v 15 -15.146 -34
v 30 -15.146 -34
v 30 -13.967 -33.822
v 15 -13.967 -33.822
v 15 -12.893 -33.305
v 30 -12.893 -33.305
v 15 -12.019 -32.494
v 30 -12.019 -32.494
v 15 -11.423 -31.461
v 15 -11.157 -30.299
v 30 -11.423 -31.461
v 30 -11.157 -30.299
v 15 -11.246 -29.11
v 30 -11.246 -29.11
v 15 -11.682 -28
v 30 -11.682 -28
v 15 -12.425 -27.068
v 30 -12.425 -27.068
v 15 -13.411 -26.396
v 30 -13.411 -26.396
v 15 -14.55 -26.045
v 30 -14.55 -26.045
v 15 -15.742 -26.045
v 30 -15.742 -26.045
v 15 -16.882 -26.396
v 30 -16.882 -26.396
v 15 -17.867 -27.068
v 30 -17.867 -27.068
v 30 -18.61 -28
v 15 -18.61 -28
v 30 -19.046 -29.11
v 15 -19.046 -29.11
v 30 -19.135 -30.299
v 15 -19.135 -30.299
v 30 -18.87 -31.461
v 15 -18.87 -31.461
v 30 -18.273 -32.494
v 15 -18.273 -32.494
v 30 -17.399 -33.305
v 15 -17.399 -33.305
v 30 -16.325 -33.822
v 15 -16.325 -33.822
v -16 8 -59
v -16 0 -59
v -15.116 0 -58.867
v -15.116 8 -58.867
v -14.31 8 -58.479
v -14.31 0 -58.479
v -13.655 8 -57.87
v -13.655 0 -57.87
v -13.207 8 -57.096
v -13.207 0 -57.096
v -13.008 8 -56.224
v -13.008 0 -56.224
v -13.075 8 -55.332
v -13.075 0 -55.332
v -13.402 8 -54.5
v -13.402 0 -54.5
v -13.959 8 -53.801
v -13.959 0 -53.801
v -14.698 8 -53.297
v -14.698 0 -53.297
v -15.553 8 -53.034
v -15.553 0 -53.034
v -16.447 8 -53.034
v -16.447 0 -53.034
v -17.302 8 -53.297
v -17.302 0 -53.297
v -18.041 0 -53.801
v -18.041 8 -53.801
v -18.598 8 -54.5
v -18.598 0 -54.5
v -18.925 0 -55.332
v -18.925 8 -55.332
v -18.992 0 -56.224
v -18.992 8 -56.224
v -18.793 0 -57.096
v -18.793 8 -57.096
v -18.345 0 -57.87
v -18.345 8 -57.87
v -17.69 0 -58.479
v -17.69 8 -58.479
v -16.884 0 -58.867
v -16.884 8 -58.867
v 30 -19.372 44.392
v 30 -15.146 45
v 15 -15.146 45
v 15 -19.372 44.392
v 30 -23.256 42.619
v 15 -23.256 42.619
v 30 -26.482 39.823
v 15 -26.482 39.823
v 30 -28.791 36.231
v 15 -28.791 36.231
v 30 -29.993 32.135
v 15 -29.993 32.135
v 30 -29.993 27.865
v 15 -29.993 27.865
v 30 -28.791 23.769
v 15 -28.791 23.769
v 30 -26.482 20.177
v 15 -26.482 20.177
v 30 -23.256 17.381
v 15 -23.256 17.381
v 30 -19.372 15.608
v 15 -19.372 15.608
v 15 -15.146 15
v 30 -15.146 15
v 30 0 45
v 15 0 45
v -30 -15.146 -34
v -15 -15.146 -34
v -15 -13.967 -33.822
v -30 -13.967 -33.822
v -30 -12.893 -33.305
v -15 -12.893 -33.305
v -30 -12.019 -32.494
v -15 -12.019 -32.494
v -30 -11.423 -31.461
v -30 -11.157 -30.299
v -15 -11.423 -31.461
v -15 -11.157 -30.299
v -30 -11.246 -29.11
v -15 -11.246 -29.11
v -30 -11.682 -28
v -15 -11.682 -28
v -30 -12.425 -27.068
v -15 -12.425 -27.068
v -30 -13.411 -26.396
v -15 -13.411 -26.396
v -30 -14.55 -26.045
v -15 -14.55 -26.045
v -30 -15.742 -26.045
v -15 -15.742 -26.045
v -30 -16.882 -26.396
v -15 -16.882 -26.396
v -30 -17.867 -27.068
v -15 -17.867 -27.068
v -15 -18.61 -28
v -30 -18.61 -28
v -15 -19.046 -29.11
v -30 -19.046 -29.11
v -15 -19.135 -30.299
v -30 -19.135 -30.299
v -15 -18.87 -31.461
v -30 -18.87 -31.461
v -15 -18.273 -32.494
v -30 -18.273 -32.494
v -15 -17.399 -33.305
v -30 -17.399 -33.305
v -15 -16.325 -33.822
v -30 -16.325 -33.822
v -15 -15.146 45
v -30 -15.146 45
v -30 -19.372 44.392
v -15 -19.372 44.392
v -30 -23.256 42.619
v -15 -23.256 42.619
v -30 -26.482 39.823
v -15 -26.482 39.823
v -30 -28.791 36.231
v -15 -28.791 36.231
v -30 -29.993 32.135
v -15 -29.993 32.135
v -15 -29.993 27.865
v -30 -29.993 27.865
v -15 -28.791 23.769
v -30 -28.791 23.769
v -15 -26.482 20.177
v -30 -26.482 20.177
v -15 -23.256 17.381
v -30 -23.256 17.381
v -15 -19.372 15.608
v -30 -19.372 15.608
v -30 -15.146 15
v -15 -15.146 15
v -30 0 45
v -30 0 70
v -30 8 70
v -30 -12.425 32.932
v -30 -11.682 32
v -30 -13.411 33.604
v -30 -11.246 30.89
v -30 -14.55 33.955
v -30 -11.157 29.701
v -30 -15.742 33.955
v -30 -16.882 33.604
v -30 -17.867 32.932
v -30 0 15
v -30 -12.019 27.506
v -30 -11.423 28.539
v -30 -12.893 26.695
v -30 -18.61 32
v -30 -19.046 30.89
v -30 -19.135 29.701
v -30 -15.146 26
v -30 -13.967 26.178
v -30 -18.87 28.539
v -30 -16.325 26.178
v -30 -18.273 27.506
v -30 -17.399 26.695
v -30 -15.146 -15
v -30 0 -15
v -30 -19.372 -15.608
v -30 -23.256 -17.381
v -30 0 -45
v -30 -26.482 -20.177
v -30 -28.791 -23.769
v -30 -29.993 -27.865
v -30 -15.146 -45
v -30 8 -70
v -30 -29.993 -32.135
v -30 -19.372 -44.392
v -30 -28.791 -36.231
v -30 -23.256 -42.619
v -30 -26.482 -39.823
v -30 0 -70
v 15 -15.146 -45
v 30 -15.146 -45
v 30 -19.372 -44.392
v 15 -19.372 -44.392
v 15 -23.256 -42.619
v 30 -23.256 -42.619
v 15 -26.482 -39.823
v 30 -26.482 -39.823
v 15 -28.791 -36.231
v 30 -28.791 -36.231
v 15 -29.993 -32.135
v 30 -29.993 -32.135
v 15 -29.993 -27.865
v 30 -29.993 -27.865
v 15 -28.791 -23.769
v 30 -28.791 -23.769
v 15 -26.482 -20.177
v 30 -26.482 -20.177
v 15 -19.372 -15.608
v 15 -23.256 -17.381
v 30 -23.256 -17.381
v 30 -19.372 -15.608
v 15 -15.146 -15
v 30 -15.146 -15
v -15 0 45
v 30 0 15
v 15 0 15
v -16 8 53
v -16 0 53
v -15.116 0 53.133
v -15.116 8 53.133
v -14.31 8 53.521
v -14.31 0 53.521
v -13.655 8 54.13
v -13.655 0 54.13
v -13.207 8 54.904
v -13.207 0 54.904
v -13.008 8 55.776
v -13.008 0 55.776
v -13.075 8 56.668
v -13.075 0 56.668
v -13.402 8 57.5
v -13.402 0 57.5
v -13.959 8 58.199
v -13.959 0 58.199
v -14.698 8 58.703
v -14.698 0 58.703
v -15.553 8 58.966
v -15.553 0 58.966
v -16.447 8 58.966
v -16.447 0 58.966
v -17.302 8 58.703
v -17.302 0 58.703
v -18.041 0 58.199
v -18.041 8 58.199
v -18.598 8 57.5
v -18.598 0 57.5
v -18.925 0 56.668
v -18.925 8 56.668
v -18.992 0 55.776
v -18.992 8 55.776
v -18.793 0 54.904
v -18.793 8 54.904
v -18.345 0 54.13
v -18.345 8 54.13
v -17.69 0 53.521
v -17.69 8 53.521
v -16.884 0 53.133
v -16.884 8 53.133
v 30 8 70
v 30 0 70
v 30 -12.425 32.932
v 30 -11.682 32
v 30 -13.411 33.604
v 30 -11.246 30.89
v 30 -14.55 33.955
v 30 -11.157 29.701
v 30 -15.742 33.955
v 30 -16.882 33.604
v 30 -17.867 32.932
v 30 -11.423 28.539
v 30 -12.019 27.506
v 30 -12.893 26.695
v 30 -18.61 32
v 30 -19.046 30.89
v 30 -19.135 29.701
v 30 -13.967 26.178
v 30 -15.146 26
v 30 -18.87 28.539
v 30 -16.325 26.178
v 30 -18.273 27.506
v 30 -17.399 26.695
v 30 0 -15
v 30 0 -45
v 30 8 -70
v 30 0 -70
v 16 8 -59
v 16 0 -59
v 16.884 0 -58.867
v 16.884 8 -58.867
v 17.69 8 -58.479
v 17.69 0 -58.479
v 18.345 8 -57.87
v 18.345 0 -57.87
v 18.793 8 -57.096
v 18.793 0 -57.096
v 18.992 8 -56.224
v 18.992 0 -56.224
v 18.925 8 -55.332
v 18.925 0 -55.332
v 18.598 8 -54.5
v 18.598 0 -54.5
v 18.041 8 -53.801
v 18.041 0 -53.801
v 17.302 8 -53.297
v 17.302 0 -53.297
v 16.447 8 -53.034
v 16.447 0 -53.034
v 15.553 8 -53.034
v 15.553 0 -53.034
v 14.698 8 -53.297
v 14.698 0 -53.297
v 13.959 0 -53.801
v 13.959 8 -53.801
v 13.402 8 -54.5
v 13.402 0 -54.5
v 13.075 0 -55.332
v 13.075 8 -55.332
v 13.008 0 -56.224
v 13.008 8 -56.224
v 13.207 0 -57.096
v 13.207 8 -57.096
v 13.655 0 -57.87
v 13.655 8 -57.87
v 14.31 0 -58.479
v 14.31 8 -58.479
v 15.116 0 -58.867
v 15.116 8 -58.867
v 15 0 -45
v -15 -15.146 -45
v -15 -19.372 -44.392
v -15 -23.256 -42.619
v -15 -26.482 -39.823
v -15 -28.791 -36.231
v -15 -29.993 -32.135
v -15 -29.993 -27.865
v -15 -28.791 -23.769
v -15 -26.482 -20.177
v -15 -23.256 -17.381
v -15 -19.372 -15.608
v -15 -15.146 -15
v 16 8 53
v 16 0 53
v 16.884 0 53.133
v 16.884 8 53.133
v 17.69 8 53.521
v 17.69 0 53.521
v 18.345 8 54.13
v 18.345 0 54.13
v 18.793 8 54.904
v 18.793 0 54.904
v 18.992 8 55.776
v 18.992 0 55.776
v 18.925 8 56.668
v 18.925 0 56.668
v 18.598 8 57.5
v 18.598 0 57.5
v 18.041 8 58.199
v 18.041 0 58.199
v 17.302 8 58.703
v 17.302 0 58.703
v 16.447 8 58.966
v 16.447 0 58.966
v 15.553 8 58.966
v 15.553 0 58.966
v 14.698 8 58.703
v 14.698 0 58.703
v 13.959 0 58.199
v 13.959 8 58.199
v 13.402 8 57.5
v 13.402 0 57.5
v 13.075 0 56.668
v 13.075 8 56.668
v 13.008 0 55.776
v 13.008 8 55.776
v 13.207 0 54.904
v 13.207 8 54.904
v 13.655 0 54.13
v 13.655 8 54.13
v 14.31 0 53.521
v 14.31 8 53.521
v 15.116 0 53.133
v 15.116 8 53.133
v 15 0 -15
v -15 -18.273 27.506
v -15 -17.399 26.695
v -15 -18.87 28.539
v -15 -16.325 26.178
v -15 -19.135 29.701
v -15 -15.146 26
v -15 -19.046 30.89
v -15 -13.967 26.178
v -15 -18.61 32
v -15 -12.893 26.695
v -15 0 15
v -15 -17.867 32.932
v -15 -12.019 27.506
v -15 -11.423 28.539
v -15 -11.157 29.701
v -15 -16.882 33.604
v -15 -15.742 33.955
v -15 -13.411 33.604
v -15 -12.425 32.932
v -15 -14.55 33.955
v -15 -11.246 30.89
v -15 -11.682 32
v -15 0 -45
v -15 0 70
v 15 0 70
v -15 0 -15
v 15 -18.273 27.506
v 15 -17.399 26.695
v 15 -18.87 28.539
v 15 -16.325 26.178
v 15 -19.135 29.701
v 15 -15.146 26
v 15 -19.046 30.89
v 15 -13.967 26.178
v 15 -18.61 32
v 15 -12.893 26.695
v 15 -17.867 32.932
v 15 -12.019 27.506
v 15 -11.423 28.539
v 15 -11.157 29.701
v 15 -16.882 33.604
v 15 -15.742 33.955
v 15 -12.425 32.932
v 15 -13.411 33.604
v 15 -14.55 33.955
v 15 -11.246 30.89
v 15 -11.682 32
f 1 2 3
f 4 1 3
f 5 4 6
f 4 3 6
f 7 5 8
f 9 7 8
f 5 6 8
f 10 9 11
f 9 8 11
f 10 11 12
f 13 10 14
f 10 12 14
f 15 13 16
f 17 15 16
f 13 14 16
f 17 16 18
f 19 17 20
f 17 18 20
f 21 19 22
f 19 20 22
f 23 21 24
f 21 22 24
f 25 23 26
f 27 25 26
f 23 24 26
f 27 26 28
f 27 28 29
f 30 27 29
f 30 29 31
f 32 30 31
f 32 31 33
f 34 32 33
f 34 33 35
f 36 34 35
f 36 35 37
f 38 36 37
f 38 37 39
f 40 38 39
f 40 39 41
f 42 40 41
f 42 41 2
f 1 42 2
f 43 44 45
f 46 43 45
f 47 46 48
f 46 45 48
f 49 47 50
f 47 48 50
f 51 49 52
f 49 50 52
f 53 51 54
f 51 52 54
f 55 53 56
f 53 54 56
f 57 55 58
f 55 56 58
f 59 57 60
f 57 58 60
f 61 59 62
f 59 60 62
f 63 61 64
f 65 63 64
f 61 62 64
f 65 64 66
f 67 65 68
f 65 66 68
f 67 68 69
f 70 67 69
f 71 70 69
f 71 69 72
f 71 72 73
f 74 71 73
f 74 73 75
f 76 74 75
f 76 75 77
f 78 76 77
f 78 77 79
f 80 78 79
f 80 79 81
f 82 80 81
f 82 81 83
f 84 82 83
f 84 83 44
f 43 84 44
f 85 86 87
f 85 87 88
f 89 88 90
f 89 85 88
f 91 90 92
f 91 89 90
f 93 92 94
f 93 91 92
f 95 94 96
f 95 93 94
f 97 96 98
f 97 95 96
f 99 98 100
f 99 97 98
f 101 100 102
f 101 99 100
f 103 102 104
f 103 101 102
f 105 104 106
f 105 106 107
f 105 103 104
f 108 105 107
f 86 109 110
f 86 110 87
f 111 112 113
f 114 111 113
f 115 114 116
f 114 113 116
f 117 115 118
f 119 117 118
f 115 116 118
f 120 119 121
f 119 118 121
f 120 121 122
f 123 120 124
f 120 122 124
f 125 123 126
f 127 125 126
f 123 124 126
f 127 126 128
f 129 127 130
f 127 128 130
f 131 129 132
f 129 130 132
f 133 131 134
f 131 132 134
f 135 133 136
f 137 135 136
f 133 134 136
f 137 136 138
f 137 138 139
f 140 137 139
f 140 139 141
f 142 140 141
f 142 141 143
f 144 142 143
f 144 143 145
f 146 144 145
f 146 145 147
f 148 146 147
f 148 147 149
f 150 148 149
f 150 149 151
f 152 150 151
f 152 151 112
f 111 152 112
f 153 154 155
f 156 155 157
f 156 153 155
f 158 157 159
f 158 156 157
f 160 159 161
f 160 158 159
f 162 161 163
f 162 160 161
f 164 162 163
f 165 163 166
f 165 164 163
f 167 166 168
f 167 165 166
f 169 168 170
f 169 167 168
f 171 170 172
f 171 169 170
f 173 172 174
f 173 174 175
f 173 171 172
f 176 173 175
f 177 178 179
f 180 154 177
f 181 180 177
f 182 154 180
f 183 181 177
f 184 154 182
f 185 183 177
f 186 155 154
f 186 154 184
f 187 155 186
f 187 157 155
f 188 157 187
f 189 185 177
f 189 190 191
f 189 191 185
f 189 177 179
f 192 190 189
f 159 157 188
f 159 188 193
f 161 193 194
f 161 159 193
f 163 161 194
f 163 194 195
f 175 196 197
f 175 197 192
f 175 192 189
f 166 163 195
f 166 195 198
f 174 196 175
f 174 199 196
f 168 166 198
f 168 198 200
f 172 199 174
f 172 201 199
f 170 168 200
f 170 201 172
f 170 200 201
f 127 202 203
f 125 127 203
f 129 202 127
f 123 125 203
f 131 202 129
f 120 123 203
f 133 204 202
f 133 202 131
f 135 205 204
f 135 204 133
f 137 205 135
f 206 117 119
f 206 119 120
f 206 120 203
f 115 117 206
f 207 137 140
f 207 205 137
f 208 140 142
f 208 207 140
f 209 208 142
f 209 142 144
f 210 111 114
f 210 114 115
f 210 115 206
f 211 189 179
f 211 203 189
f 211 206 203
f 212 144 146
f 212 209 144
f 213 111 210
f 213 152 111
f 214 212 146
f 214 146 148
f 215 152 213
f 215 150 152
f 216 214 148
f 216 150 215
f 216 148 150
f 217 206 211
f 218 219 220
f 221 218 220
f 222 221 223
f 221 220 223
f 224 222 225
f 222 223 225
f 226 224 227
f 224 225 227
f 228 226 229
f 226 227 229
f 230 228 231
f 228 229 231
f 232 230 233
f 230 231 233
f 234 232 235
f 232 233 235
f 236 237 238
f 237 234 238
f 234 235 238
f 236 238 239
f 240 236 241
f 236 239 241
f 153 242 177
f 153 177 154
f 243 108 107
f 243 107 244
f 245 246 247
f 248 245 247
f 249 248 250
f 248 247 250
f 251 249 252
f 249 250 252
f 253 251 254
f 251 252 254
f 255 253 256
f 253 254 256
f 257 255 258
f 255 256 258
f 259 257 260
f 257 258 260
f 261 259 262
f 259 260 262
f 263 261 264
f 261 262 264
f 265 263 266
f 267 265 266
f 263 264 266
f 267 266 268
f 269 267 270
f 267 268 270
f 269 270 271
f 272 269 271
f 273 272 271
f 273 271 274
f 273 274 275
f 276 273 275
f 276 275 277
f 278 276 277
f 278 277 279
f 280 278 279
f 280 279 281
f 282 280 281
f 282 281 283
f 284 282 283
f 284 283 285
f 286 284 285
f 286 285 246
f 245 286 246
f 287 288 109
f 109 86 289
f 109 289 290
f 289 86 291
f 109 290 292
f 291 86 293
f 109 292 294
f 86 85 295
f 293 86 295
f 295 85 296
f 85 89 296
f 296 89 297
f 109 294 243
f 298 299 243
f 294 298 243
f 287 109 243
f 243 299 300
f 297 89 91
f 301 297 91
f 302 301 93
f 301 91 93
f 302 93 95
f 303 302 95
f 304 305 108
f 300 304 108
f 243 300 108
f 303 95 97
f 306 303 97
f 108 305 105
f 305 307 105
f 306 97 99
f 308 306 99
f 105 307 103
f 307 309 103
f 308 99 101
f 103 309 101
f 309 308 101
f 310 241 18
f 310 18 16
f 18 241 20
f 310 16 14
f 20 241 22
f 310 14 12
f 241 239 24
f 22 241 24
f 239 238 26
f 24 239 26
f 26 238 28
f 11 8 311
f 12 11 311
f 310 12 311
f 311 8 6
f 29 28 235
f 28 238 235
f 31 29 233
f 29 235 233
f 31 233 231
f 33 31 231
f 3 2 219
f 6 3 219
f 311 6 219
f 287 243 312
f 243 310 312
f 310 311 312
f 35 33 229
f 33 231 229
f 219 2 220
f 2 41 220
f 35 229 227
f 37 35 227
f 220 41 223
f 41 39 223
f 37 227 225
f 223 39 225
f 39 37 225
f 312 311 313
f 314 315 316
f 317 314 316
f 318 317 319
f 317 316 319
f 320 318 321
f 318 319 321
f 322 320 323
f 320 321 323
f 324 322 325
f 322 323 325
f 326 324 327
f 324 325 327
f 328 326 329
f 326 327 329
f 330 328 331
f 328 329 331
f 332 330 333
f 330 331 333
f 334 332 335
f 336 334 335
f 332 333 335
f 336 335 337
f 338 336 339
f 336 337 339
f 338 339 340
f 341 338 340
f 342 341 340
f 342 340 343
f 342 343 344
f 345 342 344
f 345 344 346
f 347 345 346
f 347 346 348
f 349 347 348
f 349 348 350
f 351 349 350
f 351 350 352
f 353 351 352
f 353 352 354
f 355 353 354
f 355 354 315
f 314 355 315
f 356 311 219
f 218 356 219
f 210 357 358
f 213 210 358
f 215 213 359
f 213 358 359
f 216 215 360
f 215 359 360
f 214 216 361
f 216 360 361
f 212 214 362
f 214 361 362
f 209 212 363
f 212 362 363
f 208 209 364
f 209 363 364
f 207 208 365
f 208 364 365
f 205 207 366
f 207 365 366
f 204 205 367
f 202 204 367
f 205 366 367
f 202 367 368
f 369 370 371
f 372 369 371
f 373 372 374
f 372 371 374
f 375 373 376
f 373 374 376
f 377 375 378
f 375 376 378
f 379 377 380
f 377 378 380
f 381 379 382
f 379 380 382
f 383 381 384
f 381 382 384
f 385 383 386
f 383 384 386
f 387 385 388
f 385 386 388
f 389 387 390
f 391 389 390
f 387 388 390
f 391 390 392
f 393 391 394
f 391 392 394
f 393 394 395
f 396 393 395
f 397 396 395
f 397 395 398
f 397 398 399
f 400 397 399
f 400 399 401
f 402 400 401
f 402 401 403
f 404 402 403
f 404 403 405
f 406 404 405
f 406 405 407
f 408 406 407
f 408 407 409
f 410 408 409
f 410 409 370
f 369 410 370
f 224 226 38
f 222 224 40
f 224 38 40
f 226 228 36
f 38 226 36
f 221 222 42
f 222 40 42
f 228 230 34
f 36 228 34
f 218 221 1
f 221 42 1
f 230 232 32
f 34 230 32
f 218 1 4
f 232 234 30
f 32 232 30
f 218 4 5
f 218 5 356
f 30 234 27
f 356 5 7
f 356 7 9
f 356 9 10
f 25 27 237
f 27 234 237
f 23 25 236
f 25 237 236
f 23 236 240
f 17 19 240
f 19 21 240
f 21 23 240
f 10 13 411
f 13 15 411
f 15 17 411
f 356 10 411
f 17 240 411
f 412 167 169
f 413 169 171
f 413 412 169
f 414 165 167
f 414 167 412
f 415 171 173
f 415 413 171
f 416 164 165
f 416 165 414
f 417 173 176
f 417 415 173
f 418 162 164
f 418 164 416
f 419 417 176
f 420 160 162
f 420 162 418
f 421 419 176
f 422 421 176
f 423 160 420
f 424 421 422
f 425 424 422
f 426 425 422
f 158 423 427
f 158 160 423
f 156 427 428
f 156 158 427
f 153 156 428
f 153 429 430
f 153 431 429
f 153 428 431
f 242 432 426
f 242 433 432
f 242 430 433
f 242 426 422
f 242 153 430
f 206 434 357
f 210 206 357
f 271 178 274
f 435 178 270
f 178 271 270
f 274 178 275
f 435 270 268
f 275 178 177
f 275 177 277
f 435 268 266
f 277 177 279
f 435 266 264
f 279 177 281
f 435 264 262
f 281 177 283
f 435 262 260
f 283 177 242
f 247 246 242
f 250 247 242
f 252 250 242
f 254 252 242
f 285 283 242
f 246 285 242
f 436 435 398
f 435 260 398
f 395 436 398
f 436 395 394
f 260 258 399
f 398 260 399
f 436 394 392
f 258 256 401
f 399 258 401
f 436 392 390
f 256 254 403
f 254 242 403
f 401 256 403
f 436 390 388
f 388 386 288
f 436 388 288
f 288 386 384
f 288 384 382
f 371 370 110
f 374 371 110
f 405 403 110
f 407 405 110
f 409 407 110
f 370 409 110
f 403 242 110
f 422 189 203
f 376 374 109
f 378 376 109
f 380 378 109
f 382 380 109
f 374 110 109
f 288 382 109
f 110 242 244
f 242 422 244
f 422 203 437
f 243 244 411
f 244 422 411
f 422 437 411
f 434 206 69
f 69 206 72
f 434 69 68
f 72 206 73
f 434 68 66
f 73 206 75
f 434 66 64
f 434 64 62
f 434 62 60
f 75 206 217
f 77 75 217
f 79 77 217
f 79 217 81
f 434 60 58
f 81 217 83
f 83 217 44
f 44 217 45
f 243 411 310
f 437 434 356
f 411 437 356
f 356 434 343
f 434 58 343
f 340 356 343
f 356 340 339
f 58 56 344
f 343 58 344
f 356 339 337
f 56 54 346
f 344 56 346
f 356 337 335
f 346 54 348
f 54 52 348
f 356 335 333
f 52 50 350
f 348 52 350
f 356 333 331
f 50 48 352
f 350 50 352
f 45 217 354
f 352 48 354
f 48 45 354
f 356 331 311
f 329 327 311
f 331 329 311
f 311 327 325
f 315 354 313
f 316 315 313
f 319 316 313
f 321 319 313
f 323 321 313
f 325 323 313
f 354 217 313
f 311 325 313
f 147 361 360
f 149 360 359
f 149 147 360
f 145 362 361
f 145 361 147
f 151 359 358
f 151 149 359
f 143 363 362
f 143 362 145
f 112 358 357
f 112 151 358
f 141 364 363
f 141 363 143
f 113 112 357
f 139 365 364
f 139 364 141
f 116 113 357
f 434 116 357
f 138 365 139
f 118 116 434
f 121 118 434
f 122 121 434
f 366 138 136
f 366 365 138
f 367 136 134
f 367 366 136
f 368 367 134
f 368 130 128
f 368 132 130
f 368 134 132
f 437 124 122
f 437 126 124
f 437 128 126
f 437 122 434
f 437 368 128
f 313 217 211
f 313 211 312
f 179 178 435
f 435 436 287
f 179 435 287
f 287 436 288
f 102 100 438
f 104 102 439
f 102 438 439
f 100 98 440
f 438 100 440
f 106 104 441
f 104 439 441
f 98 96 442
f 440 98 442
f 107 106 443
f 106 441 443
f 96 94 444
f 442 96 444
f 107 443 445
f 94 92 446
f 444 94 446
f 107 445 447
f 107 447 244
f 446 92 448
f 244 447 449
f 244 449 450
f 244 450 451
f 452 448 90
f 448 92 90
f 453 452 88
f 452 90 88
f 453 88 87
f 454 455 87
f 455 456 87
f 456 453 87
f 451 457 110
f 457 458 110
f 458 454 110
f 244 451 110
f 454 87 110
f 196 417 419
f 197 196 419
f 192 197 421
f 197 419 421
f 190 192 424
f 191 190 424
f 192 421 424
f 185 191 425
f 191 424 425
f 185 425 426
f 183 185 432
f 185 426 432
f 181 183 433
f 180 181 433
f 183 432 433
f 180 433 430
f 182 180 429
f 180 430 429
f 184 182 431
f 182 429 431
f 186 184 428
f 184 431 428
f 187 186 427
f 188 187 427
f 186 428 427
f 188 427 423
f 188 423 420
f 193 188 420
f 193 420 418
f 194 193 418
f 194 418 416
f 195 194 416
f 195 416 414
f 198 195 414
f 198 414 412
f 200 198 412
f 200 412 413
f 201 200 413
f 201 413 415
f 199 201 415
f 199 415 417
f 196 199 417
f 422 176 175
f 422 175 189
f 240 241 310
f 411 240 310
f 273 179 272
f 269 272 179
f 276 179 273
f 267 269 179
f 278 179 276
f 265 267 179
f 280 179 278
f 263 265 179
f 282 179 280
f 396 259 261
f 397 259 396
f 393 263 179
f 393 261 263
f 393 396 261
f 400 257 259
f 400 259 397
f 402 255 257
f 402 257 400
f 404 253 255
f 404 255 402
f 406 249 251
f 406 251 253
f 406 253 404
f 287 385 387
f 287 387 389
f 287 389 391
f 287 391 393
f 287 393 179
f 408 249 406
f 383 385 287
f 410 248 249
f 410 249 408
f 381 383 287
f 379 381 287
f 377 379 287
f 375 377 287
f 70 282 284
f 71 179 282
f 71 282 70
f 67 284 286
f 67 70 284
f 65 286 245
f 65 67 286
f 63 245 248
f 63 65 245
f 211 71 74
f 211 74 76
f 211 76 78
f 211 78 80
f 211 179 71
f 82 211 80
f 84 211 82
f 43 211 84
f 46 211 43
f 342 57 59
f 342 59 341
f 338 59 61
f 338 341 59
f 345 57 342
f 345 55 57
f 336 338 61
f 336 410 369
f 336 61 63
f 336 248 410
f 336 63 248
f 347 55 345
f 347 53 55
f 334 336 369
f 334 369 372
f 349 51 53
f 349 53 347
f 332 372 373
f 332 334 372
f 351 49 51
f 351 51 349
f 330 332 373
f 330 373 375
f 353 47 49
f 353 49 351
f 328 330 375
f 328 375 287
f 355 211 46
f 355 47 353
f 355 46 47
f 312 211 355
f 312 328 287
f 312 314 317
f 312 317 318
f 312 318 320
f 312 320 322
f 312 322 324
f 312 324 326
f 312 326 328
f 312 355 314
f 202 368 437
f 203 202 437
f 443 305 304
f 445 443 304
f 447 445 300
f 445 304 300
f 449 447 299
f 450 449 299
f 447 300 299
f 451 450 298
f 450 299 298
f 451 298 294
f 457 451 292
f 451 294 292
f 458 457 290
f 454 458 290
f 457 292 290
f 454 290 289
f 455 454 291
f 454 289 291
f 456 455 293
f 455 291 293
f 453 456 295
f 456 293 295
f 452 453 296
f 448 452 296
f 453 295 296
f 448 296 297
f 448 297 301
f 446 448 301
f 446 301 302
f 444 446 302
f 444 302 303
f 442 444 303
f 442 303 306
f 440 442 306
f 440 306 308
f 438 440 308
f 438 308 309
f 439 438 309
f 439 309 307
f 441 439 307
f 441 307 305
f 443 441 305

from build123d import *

# Parameters (mm, degrees)
SKETCH1_W           = 60
SKETCH1_H           = 140
BOSS_EXTRUDE1_DEPTH = 8
BOSS_EXTRUDE2_DEPTH = 60
CUT_EXTRUDE1_REACH  = 98.999
SKETCH5_R           = 4
SKETCH6_W           = 30
SKETCH6_H           = 30.146106113
CUT_EXTRUDE2_DEPTH  = 147.317421088
SKETCH7_R           = 3
CUT_EXTRUDE3_DEPTH  = 10


with BuildPart() as part:
    # Sketch1 → Boss-Extrude1 (new body)
    with BuildSketch(Plane(origin=(0, 0, 0), x_dir=(1, 0, 0), z_dir=(0, 1, 0))):
        Rectangle(SKETCH1_W, SKETCH1_H)
    extrude(amount=BOSS_EXTRUDE1_DEPTH)

    # Sketch3 → Boss-Extrude2 (add)
    with BuildSketch(Plane(origin=(30, 0, 0), x_dir=(0, 0, -1), z_dir=(1, 0, 0))):
        with BuildLine():
            Line((15, -15.146106113), (15, 0))
            Line((15, 0), (45, 0))
            Line((45, 0), (45, -15.146106113))
            ThreePointArc((45, -15.146106113), (30, -30.146106113), (15, -15.146106113))
        make_face()
    boss_extrude2 = extrude(amount=-BOSS_EXTRUDE2_DEPTH)

    # Mirror1: Boss-Extrude2 across plane
    add(boss_extrude2.mirror(Plane.XY))

    # Sketch5 → Cut-Extrude1 (cut, up to next)
    with BuildSketch(Plane(origin=(30, 0, 0), x_dir=(0, 0, -1), z_dir=(1, 0, 0)), mode=Mode.PRIVATE) as cut_extrude1_sk1:
        with Locations((30, -15.146106113)):
            Circle(SKETCH5_R)
    cut_extrude1_tool1 = extrude(cut_extrude1_sk1.sketch, amount=-CUT_EXTRUDE1_REACH, mode=Mode.PRIVATE) & part.part
    # Sketch5 → Cut-Extrude1 (cut, up to next)
    with BuildSketch(Plane(origin=(30, 0, 0), x_dir=(0, 0, -1), z_dir=(1, 0, 0)), mode=Mode.PRIVATE) as cut_extrude1_sk2:
        with Locations((-30, -15.146106113)):
            Circle(SKETCH5_R)
    cut_extrude1_tool2 = extrude(cut_extrude1_sk2.sketch, amount=-CUT_EXTRUDE1_REACH, mode=Mode.PRIVATE) & part.part
    add(cut_extrude1_tool1.solids().sort_by_distance((30, -15.146106, -30))[0], mode=Mode.SUBTRACT)
    add(cut_extrude1_tool2.solids().sort_by_distance((30, -15.146106, 30))[0], mode=Mode.SUBTRACT)

    # Sketch6 → Cut-Extrude2 (cut, through all)
    with BuildSketch(Plane.XY.offset(70)):
        with Locations((0, -15.073053057)):
            Rectangle(SKETCH6_W, SKETCH6_H)
    extrude(amount=-CUT_EXTRUDE2_DEPTH, mode=Mode.SUBTRACT)

    # Sketch7 → Cut-Extrude3 (cut)
    with BuildSketch(Plane.XZ):
        with Locations(Location((-16, -56, 0), (0, 0, 270))):
            Circle(SKETCH7_R)
        with Locations(Location((-16, 56, 0), (0, 0, 270))):
            Circle(SKETCH7_R)
        with Locations(Location((16, 56, 0), (0, 0, 270))):
            Circle(SKETCH7_R)
        with Locations(Location((16, -56, 0), (0, 0, 270))):
            Circle(SKETCH7_R)
    extrude(amount=-CUT_EXTRUDE3_DEPTH, mode=Mode.SUBTRACT)


solid = part.part
